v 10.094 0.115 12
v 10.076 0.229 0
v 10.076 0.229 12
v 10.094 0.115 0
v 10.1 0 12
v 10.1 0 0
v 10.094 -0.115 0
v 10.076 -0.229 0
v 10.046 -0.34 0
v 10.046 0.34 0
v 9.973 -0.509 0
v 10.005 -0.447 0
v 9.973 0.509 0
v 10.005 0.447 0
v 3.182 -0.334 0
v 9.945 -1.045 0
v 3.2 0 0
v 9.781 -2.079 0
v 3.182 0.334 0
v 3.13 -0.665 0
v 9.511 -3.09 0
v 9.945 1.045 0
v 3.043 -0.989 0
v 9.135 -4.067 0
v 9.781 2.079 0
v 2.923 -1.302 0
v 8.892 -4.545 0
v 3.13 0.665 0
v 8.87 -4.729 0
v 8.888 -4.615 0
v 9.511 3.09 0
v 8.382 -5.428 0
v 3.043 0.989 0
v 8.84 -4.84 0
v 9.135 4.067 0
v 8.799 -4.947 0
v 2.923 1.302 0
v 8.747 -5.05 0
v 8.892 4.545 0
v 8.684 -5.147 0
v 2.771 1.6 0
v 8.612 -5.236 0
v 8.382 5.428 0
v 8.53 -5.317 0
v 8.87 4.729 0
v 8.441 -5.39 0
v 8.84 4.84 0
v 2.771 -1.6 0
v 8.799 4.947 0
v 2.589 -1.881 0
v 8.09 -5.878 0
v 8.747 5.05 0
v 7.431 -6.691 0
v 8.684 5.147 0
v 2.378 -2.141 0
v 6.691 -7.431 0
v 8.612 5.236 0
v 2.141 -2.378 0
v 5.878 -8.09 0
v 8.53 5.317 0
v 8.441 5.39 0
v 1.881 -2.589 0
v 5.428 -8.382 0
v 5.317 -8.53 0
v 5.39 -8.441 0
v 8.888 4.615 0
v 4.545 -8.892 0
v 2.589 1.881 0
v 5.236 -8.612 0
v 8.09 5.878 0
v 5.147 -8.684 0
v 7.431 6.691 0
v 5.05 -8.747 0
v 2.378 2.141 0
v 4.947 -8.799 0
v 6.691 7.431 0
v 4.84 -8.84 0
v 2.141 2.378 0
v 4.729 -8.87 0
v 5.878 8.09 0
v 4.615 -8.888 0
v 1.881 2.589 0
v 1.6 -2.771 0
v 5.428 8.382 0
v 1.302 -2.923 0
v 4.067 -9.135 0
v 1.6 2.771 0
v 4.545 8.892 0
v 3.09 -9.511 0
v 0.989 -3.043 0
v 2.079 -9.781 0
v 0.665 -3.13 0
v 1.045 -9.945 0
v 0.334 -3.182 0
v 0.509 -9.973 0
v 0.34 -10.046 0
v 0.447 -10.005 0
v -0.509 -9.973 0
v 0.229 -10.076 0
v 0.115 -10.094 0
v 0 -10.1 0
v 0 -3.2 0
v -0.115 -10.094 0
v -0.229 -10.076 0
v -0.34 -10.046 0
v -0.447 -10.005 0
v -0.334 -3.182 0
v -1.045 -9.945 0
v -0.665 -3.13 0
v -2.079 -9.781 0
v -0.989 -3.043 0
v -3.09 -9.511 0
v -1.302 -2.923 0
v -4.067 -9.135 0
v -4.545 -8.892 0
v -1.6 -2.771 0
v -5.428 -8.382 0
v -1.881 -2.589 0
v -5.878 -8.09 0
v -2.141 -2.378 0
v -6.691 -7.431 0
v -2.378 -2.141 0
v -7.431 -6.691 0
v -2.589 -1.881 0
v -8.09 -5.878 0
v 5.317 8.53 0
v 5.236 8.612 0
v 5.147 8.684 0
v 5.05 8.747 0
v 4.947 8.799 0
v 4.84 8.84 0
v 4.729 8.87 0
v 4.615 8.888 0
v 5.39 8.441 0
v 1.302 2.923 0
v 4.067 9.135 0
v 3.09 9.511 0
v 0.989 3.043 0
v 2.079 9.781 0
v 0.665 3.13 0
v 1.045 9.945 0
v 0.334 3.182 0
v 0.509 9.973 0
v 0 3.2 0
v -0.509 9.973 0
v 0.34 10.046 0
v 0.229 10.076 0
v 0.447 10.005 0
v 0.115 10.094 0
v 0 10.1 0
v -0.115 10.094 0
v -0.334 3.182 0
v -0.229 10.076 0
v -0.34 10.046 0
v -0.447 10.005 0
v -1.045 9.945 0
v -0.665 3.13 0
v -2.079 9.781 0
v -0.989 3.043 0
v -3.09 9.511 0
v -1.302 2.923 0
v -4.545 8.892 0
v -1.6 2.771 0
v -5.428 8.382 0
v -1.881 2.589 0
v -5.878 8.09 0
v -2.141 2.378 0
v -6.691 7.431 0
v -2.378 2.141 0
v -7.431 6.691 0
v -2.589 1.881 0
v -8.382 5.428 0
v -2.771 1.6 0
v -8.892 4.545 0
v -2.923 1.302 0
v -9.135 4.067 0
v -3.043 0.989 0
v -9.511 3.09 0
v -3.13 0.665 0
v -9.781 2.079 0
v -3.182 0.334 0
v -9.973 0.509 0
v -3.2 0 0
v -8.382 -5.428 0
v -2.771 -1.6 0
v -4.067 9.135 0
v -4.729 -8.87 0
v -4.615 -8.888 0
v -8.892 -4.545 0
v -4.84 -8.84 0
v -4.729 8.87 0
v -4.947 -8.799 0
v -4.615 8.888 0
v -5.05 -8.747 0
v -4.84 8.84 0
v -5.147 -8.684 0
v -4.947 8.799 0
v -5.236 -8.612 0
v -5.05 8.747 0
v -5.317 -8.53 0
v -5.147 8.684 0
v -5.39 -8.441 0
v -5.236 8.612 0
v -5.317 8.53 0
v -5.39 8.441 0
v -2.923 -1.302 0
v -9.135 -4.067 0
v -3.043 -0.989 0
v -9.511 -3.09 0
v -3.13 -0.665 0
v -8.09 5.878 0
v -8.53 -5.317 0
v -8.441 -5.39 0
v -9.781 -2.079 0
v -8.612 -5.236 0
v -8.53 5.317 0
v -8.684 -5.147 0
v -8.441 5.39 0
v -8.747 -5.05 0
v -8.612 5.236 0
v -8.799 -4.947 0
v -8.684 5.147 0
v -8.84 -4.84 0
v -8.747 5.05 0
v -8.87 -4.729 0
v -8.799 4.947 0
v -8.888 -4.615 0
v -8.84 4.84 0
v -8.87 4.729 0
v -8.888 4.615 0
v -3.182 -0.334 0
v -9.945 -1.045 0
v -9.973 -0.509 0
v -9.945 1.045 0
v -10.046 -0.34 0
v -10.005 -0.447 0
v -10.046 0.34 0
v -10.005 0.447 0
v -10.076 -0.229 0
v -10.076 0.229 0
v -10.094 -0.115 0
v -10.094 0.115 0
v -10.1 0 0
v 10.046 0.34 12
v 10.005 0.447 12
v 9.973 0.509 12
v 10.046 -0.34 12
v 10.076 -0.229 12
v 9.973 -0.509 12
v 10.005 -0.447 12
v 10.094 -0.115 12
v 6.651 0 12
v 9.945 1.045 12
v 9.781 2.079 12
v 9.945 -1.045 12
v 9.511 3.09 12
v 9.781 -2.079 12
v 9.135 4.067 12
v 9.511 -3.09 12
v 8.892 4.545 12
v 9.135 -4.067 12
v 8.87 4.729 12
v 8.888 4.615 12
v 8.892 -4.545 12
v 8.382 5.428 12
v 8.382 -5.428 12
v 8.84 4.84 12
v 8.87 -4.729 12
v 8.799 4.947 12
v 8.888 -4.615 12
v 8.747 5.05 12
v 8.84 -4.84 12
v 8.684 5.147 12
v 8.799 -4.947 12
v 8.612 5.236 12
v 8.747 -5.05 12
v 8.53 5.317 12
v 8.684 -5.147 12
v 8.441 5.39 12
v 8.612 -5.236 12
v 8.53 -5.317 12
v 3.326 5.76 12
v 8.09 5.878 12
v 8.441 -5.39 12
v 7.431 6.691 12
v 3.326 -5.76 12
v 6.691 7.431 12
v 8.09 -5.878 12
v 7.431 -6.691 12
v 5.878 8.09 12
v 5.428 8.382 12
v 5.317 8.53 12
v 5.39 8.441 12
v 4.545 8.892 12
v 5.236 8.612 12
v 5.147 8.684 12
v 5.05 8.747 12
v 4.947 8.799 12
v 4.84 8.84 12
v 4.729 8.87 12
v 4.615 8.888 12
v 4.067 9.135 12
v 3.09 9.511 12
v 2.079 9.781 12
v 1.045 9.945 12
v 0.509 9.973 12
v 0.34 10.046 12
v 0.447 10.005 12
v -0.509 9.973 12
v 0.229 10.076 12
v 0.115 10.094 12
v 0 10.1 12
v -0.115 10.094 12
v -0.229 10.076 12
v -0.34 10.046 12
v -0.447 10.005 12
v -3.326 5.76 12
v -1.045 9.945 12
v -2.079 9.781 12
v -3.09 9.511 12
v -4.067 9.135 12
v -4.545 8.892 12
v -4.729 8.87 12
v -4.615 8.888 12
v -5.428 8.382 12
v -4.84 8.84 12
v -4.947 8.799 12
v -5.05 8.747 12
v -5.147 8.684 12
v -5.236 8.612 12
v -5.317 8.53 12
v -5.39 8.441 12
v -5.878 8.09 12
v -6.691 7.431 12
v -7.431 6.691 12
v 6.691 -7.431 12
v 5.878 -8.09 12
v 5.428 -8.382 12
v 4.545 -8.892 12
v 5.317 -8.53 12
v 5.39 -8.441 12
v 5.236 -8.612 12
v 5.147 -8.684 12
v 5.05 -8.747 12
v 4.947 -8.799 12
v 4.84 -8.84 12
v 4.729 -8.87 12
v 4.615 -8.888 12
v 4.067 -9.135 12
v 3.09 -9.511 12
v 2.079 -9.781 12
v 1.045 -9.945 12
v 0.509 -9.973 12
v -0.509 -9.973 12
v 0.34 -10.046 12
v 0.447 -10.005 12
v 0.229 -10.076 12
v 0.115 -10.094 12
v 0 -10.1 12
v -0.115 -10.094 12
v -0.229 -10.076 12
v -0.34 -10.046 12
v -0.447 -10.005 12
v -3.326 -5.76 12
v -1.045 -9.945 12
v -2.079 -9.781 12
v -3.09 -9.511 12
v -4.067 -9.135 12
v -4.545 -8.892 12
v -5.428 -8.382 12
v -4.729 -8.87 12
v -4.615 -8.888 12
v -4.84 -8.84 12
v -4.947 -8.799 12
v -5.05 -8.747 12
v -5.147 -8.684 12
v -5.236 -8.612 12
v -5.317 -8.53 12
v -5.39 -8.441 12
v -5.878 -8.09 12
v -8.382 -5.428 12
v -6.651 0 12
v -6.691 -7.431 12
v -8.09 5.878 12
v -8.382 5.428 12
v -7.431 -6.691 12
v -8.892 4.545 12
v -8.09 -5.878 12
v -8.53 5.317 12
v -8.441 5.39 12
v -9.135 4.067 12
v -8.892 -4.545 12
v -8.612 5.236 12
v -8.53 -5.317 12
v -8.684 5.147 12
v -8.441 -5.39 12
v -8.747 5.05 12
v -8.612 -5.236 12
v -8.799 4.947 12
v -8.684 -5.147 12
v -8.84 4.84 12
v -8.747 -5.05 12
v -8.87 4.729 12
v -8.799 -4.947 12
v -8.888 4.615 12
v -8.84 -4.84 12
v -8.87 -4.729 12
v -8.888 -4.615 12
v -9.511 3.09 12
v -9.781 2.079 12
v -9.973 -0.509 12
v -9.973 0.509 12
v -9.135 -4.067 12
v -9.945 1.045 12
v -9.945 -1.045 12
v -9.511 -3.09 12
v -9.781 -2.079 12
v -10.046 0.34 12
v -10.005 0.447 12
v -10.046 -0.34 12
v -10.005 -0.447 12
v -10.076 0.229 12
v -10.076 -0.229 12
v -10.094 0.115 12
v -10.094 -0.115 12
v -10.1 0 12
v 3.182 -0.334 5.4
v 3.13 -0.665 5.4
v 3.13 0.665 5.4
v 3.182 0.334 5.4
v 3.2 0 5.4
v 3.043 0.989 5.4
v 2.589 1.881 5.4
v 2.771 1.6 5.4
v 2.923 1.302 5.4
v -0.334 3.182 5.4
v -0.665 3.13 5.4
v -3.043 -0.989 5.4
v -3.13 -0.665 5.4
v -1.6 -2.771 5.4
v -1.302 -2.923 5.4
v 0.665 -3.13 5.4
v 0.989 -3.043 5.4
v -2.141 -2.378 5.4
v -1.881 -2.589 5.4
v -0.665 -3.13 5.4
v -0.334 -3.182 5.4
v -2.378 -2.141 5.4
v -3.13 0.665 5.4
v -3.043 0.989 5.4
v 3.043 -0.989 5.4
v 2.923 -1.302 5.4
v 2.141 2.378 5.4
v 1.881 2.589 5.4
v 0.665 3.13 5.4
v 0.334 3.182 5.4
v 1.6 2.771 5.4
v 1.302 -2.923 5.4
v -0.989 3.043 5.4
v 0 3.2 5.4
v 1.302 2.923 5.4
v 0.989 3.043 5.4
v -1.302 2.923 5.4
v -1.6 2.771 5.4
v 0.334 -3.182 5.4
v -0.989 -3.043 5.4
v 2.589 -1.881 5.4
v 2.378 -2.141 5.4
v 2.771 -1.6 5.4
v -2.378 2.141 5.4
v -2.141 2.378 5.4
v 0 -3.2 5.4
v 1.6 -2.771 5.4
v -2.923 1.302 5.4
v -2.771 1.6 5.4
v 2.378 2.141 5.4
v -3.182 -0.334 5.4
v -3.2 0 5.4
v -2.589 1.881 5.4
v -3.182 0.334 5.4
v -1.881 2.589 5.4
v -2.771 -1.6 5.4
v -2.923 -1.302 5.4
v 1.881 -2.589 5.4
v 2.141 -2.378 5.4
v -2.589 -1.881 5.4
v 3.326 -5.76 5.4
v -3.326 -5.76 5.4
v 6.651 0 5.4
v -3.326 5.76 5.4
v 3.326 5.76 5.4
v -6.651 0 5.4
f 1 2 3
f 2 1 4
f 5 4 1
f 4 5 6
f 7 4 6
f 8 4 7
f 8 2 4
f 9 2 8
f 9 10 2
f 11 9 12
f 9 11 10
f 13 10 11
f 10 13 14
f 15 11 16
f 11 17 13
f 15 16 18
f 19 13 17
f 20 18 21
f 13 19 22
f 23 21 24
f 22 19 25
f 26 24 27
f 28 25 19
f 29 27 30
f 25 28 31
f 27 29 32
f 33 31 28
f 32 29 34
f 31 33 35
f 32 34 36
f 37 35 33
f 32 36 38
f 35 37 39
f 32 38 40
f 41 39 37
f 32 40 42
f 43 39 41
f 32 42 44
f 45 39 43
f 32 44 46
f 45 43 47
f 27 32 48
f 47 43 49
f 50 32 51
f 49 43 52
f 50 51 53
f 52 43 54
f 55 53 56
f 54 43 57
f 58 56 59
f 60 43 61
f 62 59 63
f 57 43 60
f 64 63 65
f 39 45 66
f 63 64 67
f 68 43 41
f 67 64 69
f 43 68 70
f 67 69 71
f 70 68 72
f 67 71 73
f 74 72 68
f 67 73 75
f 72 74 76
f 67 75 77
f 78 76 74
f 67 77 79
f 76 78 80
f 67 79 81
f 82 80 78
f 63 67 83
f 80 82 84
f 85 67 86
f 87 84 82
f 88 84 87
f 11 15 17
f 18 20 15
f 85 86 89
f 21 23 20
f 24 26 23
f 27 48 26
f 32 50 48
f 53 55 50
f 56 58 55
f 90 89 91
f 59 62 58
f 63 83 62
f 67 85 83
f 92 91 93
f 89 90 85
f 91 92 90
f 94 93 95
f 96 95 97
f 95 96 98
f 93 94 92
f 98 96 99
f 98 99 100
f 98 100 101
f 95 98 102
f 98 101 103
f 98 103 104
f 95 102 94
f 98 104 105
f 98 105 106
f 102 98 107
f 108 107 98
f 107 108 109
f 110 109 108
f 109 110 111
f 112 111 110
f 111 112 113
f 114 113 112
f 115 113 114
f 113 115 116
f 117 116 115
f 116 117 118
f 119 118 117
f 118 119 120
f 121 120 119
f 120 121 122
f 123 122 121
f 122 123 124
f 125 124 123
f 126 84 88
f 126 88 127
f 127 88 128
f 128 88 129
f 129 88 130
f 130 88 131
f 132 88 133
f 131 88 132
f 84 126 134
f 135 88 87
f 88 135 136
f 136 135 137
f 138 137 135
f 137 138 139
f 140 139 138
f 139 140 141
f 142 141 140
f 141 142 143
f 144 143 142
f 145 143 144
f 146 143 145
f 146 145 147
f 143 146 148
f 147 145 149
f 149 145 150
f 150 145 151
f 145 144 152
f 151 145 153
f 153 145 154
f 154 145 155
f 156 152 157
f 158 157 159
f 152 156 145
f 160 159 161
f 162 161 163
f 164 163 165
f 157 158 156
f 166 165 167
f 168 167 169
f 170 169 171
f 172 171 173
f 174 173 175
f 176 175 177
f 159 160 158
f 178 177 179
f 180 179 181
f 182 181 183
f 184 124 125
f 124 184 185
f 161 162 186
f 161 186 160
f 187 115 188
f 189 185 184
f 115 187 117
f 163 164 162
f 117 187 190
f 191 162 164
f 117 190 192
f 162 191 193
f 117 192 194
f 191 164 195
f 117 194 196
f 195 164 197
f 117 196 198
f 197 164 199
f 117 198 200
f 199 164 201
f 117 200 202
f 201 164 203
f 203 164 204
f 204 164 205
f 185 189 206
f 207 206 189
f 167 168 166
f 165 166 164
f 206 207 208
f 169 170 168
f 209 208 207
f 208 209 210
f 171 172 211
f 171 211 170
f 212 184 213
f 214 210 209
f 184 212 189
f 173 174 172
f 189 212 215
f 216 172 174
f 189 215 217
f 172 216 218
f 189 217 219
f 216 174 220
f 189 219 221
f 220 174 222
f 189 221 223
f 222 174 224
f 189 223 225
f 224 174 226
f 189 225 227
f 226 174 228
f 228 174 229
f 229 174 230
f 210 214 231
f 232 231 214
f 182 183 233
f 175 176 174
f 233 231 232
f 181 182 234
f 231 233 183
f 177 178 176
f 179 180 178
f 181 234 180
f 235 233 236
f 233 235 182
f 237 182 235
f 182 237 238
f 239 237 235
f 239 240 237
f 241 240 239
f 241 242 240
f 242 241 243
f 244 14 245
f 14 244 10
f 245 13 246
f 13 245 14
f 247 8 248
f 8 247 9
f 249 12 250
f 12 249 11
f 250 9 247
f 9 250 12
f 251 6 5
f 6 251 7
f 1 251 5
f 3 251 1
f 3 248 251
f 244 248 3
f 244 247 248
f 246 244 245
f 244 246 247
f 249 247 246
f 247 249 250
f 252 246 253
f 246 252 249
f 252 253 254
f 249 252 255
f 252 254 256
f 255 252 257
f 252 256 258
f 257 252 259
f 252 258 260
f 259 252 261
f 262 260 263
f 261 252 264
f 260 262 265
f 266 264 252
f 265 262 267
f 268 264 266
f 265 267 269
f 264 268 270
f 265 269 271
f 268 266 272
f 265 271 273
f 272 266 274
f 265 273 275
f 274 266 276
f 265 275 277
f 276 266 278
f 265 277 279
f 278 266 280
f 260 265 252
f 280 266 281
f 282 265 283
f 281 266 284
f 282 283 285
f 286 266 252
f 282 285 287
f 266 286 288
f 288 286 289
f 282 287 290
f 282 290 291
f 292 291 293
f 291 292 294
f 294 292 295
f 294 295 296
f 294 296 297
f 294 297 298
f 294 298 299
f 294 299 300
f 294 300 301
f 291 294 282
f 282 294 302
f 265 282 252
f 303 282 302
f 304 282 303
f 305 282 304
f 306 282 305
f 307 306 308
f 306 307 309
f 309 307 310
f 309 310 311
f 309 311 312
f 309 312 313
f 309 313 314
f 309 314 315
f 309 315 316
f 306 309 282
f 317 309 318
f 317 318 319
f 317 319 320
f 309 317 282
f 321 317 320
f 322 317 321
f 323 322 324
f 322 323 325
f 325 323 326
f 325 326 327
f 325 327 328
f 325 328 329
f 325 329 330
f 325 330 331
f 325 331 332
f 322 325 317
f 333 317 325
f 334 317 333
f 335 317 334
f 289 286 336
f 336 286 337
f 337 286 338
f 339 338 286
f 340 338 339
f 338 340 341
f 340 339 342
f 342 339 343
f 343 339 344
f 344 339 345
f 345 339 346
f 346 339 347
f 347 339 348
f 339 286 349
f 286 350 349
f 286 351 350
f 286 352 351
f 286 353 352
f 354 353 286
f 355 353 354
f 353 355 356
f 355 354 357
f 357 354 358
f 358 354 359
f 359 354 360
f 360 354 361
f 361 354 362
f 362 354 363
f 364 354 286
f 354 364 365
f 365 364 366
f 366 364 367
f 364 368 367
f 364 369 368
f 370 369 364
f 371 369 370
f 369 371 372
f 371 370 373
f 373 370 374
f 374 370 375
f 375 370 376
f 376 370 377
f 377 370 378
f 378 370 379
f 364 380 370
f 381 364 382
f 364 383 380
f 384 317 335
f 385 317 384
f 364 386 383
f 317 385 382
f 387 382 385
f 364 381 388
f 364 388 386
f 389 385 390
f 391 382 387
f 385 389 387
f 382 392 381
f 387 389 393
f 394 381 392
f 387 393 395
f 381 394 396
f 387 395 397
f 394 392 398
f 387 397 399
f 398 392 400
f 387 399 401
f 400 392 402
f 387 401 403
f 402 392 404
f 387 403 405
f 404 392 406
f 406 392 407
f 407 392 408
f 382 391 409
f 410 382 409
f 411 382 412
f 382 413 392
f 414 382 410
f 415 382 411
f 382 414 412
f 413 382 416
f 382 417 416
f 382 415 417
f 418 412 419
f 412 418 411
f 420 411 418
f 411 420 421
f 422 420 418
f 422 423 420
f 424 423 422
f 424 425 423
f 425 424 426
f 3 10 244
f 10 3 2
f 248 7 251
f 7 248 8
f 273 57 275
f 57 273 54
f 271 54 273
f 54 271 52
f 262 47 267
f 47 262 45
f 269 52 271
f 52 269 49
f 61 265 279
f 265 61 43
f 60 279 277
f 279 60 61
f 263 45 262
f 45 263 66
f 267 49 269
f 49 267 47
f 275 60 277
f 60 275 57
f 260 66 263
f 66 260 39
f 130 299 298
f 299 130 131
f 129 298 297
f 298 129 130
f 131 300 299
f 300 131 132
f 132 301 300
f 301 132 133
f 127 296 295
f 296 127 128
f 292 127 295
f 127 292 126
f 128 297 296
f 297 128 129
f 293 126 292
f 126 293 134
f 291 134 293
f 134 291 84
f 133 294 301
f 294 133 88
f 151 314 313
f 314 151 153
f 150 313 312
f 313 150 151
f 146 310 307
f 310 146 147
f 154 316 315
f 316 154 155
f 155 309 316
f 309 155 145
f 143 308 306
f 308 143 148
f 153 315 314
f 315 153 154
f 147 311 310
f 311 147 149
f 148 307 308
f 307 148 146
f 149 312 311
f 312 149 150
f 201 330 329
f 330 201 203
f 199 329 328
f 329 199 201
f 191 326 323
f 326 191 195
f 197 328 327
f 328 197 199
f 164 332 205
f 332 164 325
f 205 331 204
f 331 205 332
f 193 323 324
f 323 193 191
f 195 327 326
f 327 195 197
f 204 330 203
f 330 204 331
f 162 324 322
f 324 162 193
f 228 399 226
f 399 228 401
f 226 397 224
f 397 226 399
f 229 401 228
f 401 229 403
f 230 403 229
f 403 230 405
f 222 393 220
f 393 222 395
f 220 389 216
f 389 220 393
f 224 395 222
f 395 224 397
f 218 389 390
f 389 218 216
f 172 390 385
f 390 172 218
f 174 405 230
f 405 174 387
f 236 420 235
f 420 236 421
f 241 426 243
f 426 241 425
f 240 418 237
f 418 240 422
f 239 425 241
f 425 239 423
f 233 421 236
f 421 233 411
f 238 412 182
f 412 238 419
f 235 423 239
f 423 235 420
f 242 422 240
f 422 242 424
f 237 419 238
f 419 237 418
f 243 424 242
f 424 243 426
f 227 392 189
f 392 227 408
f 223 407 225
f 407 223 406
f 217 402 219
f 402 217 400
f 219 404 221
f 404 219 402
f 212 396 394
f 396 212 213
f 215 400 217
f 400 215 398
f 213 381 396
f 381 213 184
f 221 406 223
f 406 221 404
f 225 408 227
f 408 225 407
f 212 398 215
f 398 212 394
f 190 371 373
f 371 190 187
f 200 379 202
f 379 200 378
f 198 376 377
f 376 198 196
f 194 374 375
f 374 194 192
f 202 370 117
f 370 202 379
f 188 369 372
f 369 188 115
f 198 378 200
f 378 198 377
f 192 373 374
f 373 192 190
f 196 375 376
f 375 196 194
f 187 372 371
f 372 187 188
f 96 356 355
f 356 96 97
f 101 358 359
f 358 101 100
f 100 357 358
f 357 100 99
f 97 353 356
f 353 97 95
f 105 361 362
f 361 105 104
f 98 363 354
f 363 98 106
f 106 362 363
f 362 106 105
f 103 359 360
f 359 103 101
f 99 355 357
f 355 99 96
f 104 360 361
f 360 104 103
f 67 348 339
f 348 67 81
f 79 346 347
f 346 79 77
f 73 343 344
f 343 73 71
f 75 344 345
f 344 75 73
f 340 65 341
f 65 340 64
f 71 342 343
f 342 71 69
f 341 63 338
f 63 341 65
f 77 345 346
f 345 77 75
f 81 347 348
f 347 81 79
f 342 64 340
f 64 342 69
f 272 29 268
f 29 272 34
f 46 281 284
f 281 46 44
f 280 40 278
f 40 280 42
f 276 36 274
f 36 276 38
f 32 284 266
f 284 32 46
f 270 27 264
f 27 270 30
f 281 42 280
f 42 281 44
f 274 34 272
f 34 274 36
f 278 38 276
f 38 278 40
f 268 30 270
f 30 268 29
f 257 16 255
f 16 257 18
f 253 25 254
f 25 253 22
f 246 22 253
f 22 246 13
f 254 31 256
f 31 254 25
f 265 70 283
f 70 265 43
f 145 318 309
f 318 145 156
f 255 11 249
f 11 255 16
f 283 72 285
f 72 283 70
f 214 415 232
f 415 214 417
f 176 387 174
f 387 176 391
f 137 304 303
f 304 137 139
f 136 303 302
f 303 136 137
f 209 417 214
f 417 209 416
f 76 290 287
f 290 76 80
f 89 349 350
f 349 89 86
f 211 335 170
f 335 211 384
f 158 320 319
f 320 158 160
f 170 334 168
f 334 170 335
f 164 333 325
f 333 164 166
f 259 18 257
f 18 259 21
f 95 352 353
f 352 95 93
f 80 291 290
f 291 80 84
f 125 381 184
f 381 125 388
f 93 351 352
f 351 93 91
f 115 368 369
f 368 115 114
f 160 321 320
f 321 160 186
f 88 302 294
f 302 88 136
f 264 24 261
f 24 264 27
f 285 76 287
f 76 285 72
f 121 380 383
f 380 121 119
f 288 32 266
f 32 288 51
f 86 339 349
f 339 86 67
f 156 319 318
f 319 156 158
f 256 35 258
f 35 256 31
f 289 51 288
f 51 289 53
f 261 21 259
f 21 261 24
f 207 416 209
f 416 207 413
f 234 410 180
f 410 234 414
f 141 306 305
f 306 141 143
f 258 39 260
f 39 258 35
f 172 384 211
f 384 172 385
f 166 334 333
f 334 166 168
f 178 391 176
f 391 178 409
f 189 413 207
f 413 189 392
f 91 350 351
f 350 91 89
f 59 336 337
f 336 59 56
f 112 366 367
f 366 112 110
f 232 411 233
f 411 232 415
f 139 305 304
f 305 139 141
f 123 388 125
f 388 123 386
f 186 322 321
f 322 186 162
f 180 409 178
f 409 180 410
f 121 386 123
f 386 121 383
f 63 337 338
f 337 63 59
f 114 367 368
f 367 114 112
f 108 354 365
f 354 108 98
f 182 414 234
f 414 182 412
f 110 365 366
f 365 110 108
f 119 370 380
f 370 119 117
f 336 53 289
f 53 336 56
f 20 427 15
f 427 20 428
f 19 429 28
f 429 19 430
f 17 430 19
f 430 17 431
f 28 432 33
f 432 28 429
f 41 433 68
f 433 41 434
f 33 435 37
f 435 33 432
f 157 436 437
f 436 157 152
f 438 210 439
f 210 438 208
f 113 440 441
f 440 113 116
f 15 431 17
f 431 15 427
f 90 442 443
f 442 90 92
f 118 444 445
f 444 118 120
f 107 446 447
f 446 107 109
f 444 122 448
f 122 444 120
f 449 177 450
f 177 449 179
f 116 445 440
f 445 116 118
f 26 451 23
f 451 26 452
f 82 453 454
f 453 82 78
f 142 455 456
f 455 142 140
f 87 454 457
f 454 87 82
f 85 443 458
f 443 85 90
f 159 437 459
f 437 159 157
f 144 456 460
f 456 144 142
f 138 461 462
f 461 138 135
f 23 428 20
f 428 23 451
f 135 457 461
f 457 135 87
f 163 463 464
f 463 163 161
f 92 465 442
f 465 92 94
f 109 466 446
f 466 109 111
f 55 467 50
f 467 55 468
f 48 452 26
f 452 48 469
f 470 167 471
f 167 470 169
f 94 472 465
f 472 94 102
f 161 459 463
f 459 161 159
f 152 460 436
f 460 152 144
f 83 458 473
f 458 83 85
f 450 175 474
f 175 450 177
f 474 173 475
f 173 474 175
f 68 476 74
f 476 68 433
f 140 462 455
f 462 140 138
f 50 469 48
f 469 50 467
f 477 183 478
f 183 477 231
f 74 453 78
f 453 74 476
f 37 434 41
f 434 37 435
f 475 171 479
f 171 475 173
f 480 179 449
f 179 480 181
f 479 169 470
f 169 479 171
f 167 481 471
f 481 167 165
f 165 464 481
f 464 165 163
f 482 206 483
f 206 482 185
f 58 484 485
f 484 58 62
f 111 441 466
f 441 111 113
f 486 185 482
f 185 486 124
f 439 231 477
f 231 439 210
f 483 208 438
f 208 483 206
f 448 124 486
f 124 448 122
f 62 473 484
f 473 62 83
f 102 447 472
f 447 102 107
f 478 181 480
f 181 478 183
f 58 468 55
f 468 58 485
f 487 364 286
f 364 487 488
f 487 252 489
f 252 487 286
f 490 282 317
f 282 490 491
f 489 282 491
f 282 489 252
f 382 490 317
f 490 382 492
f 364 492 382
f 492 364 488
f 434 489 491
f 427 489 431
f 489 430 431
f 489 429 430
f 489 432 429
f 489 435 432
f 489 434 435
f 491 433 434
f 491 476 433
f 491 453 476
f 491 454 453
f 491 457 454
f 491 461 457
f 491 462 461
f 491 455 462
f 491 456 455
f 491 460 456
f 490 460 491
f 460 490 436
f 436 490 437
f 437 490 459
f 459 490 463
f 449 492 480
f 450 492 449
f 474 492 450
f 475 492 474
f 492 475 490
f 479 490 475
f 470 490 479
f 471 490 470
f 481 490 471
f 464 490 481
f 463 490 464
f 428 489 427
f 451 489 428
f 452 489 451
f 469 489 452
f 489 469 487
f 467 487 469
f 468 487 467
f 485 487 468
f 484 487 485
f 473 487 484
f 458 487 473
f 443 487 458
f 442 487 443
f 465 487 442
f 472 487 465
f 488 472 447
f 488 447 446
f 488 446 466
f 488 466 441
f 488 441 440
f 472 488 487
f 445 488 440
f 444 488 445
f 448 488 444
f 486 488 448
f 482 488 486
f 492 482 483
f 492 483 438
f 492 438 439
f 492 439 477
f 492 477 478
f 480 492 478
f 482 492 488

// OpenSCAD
// Knurled-style thumb knob with hex socket.
$fn = 60;
eps = 0.02;
thread_d = 6.4;
knob_d = 20;
knob_h = 12;
socket_flat = thread_d * 1.8;
difference() {
    union() {
        cylinder(d = knob_d, h = knob_h);
        for (i = [0 : 11]) rotate([0, 0, i * 30]) translate([knob_d / 2 - 1, 0, 0]) cylinder(d = 2.2, h = knob_h);
    }
    translate([0, 0, -eps]) cylinder(d = thread_d, h = knob_h + 2 * eps);
    translate([0, 0, knob_h - knob_h * 0.55]) cylinder(d = socket_flat / cos(30), h = knob_h * 0.55 + eps, $fn = 6);
}
